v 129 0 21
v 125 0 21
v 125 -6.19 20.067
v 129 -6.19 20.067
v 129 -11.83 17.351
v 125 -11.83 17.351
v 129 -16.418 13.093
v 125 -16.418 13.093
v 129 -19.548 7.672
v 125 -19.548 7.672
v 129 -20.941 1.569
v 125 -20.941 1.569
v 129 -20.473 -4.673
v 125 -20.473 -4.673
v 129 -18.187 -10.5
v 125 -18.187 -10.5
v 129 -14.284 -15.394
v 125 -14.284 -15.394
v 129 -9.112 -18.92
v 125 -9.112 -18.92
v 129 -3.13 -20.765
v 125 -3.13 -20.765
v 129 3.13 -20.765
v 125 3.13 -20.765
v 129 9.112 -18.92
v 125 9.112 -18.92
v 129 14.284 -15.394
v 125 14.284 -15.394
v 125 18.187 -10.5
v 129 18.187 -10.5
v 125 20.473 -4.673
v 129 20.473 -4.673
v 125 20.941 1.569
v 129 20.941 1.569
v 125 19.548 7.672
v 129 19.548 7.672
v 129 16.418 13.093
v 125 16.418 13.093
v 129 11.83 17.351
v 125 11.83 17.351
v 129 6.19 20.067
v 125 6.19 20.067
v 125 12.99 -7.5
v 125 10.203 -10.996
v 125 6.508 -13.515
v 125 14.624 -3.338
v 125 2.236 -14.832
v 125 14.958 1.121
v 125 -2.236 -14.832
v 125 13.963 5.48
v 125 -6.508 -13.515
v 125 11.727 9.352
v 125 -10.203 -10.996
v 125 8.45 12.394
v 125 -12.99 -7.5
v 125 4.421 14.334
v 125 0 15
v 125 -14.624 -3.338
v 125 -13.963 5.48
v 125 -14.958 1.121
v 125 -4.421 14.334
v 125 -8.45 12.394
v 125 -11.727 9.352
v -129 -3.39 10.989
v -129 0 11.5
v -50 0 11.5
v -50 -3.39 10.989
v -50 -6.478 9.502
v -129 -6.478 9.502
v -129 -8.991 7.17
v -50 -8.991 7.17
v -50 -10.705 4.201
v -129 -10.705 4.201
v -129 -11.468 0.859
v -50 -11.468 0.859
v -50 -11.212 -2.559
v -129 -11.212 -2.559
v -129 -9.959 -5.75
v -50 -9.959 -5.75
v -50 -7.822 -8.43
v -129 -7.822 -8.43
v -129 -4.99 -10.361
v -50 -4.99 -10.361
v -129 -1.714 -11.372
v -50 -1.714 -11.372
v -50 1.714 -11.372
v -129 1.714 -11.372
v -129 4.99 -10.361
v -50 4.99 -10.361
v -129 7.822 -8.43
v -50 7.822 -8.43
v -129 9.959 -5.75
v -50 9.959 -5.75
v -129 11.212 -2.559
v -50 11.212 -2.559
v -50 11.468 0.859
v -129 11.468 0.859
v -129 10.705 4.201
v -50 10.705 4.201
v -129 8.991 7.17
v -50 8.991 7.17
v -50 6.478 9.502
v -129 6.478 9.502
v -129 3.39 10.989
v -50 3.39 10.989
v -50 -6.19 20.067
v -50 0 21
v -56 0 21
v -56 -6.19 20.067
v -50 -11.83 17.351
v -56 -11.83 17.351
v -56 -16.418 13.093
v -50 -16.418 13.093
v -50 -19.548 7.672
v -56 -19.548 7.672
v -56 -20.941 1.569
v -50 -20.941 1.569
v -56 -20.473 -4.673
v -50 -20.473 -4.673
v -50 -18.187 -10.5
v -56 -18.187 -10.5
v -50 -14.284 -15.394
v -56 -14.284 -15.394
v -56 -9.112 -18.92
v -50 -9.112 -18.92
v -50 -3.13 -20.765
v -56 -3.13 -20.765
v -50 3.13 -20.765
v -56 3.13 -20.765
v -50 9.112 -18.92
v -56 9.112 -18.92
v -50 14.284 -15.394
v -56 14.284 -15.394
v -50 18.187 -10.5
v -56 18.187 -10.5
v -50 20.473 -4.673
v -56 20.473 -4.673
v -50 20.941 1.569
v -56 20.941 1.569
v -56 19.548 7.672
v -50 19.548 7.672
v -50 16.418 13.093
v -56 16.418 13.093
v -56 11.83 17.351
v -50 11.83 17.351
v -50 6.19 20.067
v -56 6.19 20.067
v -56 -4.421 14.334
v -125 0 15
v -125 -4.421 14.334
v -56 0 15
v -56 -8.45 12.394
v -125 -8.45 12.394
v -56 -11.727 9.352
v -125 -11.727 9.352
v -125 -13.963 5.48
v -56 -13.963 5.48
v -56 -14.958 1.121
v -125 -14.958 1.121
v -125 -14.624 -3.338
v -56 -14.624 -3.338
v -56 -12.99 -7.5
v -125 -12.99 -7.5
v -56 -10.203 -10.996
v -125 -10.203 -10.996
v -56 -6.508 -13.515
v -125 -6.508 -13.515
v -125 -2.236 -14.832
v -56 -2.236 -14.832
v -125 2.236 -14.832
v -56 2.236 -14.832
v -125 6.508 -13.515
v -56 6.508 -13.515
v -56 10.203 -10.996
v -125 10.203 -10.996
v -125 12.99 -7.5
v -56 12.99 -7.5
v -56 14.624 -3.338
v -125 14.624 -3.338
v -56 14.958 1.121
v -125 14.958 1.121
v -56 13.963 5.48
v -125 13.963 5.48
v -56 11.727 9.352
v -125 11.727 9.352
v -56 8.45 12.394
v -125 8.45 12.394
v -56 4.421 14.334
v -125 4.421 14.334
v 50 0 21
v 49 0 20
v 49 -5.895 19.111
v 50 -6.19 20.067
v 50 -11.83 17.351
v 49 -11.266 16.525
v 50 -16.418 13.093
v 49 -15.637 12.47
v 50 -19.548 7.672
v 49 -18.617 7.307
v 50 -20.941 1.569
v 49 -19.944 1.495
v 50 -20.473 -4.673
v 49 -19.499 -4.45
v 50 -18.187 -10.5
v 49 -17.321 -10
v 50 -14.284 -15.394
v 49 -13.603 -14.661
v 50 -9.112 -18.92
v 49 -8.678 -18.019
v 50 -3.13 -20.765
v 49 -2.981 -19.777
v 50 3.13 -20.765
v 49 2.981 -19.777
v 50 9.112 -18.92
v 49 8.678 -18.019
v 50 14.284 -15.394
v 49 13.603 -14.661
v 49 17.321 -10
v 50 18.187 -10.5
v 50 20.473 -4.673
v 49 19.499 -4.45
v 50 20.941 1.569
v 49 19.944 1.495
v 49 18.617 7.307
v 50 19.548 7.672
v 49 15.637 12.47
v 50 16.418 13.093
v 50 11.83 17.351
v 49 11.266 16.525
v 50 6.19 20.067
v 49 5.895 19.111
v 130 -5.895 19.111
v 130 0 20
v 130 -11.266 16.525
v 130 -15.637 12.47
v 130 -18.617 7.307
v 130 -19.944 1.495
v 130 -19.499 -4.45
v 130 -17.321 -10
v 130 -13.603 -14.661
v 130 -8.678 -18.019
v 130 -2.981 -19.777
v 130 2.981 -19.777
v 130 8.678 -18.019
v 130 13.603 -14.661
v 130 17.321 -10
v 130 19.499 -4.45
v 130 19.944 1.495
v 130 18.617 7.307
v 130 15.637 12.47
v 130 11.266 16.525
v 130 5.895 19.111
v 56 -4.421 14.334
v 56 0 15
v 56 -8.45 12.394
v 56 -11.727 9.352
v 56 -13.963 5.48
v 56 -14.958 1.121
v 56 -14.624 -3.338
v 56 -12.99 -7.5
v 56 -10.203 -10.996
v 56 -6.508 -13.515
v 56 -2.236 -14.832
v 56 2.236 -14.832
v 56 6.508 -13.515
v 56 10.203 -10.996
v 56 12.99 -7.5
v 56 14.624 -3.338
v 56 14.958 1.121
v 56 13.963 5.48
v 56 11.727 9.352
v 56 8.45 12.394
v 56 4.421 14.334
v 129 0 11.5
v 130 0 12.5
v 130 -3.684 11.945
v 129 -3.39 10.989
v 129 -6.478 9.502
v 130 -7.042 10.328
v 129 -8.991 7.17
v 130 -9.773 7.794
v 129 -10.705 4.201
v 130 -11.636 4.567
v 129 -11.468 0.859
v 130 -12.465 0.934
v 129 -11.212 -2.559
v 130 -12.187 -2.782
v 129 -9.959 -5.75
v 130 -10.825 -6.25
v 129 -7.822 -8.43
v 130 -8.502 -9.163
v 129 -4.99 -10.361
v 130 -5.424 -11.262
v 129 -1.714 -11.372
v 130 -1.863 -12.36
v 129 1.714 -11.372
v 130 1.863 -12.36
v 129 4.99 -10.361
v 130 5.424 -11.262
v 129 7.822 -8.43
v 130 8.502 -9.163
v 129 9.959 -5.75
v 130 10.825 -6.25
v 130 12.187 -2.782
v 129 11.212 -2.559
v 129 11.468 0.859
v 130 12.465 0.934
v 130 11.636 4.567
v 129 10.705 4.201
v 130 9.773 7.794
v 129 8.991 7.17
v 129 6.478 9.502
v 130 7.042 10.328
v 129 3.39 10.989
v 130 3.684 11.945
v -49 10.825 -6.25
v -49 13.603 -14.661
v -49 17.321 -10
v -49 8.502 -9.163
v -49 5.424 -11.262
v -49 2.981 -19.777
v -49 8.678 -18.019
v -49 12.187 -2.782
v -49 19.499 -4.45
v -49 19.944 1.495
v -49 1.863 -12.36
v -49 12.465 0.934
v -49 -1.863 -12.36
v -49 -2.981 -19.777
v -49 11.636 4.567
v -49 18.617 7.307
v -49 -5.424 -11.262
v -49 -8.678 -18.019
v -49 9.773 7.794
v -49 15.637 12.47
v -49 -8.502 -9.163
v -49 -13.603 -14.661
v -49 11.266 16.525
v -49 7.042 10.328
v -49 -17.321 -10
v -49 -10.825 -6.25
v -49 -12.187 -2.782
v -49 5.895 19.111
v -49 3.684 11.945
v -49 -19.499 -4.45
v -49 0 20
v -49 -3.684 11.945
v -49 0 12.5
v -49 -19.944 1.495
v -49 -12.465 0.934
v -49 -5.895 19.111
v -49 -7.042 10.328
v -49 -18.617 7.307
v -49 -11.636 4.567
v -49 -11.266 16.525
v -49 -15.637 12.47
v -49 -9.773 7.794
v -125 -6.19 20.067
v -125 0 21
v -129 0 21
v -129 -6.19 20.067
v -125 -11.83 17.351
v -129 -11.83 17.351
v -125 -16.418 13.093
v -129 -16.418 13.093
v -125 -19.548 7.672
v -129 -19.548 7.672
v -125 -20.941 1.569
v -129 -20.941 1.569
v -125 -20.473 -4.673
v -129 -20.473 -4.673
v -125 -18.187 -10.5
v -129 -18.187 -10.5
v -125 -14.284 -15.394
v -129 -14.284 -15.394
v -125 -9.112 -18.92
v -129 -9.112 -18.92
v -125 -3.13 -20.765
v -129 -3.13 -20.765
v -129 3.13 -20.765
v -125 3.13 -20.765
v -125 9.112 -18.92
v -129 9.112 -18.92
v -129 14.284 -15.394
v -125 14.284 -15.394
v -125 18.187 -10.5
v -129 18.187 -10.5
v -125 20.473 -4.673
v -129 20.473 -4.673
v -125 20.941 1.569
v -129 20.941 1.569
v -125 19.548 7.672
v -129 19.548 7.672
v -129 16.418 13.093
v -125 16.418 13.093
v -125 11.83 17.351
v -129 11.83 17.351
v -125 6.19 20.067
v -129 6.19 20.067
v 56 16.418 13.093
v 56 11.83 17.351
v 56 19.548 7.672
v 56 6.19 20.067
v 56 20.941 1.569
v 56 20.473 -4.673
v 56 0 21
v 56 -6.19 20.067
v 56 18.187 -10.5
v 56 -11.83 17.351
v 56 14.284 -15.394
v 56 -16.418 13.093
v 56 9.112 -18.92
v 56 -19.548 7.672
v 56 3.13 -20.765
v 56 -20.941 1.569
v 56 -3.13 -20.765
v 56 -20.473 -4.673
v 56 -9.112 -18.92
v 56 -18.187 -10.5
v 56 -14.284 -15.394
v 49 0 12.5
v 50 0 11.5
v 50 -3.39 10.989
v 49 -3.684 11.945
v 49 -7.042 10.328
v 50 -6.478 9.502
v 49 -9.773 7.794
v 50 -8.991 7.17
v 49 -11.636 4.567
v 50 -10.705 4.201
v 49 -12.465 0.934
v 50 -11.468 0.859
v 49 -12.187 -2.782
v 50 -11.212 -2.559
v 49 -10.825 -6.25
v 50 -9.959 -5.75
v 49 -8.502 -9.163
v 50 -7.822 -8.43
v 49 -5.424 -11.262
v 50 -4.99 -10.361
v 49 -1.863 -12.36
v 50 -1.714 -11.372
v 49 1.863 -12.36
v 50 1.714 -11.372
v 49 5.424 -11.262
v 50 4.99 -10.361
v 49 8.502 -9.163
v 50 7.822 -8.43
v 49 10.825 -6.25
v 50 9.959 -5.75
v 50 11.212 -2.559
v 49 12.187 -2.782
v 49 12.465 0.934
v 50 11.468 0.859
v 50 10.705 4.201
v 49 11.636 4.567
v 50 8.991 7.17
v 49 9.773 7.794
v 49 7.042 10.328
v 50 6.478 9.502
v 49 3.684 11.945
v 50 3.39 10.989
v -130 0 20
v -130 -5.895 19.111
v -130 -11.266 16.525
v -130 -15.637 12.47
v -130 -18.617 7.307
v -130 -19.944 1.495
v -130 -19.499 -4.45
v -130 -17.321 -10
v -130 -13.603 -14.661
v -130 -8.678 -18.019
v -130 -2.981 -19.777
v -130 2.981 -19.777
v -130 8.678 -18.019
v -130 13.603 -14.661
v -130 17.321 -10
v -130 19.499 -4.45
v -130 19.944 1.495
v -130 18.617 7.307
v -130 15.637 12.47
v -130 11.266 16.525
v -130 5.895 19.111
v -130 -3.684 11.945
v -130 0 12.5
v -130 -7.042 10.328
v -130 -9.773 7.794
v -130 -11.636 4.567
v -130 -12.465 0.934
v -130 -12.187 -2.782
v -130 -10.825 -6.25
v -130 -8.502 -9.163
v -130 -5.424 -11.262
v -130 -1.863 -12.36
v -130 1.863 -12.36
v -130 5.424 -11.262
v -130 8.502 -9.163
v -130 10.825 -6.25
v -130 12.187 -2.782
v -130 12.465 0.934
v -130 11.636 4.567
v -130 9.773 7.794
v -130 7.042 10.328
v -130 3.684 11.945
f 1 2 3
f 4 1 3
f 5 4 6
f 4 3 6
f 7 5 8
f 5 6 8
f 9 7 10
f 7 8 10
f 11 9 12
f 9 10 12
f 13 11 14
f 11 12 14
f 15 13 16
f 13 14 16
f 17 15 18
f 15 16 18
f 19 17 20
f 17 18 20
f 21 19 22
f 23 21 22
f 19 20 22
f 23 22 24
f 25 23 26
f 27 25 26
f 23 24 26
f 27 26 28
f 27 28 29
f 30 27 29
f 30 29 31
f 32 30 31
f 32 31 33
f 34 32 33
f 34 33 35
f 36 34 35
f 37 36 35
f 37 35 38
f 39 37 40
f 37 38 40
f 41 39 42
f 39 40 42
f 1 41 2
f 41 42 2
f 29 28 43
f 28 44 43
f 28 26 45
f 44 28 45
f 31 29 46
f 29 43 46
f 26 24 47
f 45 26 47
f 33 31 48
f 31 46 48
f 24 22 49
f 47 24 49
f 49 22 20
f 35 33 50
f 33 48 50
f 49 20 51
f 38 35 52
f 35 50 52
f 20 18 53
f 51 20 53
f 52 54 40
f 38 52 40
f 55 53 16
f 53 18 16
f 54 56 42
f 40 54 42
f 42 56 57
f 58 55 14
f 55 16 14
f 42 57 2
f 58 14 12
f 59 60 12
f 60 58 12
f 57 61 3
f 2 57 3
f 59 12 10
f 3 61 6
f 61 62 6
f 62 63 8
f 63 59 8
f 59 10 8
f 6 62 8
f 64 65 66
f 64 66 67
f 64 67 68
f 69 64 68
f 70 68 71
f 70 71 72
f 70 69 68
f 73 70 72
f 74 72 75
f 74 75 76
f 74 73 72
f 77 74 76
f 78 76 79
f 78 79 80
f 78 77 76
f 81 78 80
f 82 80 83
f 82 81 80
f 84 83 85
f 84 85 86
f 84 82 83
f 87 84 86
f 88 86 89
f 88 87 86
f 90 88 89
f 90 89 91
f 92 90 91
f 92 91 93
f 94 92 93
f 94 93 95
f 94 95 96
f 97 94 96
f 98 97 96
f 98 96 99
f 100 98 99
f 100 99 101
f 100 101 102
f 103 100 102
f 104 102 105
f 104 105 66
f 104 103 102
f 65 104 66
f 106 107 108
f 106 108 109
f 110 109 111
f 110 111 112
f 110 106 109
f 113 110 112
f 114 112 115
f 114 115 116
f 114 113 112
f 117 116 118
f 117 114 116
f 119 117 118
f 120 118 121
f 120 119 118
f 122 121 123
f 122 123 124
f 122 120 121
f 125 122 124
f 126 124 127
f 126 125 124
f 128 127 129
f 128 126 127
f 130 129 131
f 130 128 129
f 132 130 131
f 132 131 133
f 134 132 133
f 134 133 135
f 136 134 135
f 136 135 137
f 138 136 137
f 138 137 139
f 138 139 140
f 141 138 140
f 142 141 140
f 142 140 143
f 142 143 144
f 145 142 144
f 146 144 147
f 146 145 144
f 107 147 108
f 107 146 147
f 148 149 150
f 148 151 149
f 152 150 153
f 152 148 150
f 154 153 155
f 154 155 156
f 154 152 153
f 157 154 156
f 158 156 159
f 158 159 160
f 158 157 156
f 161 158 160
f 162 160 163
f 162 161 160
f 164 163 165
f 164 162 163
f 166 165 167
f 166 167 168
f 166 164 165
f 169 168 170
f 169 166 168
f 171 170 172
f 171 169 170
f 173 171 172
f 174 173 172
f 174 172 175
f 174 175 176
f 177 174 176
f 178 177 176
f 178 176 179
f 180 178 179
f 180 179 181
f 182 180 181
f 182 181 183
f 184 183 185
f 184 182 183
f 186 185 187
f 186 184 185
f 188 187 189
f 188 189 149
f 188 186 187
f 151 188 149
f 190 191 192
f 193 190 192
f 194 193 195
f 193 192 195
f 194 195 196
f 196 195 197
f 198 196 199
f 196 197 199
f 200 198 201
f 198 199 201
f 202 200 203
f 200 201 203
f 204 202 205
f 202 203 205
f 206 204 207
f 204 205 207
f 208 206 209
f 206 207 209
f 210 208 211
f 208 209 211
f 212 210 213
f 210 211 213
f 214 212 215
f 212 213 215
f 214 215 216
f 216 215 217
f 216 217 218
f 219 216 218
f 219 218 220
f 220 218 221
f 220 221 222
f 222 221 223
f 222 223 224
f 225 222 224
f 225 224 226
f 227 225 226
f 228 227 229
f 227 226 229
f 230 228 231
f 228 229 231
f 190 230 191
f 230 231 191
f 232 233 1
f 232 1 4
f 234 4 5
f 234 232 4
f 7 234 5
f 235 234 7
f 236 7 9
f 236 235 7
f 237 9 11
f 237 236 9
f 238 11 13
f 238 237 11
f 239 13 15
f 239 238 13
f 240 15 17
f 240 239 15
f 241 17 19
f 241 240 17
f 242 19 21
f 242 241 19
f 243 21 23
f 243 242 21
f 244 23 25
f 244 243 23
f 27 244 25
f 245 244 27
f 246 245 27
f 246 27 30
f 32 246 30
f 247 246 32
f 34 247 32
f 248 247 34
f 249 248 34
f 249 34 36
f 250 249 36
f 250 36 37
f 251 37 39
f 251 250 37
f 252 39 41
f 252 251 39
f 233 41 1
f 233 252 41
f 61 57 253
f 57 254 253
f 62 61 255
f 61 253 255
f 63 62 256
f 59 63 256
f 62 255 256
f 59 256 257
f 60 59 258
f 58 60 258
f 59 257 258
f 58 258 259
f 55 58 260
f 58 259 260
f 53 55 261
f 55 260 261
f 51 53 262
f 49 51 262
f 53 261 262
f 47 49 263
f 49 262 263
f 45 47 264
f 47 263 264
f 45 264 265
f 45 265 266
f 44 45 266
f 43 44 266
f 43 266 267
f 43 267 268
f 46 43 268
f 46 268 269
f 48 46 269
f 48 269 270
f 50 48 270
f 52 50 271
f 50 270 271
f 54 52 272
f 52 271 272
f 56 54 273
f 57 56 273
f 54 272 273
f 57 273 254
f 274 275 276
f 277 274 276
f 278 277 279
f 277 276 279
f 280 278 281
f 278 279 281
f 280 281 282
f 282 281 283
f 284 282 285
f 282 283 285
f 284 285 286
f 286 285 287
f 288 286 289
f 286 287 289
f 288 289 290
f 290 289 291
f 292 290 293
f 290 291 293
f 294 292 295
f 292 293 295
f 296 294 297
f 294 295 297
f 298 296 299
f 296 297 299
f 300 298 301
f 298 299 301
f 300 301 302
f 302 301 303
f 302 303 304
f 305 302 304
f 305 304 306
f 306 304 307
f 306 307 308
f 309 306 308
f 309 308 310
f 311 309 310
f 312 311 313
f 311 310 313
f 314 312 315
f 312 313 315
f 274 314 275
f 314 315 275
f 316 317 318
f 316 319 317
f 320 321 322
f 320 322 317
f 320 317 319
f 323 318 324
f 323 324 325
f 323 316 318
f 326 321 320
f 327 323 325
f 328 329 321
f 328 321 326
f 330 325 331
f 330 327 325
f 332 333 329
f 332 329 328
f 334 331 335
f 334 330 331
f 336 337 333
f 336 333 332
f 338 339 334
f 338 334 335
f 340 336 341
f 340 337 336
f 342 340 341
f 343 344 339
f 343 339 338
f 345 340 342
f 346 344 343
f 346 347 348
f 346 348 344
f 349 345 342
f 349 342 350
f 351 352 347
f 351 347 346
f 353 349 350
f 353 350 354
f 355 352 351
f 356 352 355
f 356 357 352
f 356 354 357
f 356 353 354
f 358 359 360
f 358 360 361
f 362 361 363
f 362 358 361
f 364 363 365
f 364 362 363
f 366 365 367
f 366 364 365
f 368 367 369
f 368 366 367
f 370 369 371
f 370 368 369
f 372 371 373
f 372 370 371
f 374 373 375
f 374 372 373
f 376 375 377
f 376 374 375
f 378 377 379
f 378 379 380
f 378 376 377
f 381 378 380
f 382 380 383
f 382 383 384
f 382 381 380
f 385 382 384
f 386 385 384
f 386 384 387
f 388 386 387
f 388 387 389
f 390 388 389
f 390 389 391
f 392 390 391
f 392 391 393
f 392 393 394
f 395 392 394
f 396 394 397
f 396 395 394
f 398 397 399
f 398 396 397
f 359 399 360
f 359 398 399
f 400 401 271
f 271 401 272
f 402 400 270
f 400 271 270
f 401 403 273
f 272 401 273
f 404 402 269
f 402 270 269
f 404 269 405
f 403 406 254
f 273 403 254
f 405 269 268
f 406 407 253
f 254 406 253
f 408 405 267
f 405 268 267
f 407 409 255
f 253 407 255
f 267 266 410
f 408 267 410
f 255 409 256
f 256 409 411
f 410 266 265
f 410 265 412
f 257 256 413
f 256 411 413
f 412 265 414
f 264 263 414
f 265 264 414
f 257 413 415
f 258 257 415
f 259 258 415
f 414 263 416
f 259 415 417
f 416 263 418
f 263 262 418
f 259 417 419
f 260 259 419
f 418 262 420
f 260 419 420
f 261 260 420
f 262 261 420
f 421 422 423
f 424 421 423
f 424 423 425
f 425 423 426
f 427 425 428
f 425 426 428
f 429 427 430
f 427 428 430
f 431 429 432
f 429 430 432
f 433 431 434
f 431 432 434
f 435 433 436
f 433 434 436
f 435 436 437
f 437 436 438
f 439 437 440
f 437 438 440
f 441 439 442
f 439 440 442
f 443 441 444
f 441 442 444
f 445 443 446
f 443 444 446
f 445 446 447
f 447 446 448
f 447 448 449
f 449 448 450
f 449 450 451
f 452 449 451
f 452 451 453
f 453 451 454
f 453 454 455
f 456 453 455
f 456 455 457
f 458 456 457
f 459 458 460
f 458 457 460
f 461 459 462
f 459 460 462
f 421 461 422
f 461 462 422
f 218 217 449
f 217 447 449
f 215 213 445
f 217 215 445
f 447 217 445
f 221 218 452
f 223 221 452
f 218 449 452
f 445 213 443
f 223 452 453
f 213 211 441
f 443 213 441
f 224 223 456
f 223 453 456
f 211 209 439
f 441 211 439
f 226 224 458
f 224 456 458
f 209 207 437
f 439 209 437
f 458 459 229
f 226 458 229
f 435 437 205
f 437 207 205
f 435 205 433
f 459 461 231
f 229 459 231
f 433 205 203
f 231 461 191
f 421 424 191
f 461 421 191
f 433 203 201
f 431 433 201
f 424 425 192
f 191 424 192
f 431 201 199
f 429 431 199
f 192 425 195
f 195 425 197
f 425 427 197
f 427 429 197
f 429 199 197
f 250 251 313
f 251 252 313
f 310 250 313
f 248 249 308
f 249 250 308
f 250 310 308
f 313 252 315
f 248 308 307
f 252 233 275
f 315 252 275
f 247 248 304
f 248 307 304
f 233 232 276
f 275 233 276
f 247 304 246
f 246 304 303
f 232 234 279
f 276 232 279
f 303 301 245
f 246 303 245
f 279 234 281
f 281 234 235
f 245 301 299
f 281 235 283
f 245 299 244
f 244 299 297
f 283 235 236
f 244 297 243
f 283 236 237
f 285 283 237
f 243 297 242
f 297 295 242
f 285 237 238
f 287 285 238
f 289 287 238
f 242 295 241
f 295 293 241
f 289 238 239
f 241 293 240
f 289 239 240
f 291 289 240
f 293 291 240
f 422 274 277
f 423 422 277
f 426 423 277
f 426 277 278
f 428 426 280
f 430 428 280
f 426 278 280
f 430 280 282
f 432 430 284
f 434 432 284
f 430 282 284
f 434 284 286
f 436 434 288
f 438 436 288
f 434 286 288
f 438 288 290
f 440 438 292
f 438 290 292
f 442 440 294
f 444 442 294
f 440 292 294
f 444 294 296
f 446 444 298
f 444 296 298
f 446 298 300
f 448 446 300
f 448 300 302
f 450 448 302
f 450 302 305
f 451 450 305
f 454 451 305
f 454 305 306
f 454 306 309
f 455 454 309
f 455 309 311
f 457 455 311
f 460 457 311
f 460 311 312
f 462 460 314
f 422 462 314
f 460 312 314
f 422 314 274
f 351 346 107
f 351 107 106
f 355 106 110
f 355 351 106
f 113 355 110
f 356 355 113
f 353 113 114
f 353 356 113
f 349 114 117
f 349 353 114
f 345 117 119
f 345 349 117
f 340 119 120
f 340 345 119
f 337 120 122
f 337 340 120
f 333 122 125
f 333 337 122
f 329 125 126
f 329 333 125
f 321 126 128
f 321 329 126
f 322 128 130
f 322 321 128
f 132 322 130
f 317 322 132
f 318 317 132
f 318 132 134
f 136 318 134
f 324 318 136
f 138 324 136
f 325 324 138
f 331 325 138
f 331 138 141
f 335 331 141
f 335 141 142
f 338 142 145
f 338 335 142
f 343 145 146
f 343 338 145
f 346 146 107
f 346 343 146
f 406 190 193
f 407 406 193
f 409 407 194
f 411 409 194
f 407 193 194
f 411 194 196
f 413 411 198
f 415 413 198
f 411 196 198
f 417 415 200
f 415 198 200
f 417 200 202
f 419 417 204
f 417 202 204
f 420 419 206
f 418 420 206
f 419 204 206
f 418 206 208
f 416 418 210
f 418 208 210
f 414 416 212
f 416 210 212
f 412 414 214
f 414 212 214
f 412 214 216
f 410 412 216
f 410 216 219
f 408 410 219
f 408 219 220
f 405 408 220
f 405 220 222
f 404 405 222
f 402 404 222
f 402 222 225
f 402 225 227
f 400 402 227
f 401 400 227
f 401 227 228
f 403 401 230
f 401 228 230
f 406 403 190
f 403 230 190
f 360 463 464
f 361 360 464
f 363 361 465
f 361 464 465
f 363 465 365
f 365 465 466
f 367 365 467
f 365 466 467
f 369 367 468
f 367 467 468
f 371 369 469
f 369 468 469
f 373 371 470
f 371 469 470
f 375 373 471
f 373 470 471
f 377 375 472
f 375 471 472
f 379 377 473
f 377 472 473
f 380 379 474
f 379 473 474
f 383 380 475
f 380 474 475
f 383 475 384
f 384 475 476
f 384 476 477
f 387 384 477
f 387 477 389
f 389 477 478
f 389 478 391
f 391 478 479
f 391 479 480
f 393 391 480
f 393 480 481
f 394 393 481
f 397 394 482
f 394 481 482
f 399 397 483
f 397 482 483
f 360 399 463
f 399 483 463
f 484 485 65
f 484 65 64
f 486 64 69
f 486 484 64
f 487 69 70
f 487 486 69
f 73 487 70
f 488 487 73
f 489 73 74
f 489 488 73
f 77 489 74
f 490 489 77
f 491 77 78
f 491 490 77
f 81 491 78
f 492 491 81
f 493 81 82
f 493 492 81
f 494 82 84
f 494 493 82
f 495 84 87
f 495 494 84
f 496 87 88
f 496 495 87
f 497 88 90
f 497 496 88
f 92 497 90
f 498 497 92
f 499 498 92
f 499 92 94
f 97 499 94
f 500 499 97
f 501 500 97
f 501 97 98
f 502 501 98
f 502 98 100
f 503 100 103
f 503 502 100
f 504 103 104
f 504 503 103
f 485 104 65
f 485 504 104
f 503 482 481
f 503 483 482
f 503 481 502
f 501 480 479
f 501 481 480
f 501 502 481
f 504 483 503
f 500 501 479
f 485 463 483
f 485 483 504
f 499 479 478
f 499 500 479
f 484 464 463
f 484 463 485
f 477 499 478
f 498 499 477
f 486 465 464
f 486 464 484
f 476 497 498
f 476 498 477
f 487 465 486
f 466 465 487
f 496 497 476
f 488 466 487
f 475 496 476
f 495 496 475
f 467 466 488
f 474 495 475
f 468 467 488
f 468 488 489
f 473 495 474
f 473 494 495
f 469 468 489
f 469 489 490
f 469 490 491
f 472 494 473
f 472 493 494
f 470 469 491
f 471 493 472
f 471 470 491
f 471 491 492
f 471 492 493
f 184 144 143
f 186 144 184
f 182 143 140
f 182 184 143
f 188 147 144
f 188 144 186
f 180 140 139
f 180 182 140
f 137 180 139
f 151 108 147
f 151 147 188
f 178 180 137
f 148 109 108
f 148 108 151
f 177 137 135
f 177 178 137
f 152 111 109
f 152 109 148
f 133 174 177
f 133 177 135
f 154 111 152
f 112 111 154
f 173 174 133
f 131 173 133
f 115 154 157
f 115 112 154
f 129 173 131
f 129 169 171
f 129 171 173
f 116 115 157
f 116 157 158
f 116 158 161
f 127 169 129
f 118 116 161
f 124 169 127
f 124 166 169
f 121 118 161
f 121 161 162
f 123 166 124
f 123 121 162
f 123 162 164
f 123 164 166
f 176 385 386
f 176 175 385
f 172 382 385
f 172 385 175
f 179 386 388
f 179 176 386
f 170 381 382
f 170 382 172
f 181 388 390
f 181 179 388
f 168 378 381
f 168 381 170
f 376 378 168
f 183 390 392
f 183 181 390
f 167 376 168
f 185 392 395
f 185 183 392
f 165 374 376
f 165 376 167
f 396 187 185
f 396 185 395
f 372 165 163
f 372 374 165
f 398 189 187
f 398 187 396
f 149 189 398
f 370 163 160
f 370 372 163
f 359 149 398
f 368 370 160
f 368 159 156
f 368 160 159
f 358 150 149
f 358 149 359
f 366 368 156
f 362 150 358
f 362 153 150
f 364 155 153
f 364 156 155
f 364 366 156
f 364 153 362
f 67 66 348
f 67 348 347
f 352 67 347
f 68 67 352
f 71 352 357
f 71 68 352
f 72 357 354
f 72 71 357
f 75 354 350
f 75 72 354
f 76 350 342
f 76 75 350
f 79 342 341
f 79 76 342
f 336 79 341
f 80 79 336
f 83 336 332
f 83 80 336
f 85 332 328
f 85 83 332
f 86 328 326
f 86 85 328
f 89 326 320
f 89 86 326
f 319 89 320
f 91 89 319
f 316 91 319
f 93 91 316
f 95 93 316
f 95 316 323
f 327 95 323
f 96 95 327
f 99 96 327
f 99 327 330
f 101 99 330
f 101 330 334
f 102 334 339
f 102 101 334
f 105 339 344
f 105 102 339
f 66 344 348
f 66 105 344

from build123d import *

# Parameters (mm, degrees)
SFAZOWANIE1_SIZE = 1


with BuildPart() as part:
    # Szkic15 → Obr_t1 (revolve)
    with BuildSketch(Plane(origin=(0, 0, 0), x_dir=(1, 0, 0), z_dir=(0, 1, 0))):
        Polygon((130, -21), (125, -21), (125, -15), (56, -15), (56, -21), (49, -21), (49, -11.5), (130, -11.5), align=None)
    revolve(axis=Axis((0, 0, 0), (1, 0, 0)))

    # Sfazowanie1
    sfazowanie1_edges = [part.edges().sort_by_distance(p)[0] for p in [
        (49, 0, -21),
        (130, 0, -21),
        (130, 0, -11.5),
        (49, 0, -11.5),
    ]]
    chamfer(sfazowanie1_edges, length=SFAZOWANIE1_SIZE)


with BuildPart() as body_2:
    # Lustro5: mirrored copy
    add(part.part.mirror(Plane(origin=(0, 0, 0), x_dir=(0, 0, 1), z_dir=(1, 0, 0))))


solid = Compound([part.part, body_2.part])
